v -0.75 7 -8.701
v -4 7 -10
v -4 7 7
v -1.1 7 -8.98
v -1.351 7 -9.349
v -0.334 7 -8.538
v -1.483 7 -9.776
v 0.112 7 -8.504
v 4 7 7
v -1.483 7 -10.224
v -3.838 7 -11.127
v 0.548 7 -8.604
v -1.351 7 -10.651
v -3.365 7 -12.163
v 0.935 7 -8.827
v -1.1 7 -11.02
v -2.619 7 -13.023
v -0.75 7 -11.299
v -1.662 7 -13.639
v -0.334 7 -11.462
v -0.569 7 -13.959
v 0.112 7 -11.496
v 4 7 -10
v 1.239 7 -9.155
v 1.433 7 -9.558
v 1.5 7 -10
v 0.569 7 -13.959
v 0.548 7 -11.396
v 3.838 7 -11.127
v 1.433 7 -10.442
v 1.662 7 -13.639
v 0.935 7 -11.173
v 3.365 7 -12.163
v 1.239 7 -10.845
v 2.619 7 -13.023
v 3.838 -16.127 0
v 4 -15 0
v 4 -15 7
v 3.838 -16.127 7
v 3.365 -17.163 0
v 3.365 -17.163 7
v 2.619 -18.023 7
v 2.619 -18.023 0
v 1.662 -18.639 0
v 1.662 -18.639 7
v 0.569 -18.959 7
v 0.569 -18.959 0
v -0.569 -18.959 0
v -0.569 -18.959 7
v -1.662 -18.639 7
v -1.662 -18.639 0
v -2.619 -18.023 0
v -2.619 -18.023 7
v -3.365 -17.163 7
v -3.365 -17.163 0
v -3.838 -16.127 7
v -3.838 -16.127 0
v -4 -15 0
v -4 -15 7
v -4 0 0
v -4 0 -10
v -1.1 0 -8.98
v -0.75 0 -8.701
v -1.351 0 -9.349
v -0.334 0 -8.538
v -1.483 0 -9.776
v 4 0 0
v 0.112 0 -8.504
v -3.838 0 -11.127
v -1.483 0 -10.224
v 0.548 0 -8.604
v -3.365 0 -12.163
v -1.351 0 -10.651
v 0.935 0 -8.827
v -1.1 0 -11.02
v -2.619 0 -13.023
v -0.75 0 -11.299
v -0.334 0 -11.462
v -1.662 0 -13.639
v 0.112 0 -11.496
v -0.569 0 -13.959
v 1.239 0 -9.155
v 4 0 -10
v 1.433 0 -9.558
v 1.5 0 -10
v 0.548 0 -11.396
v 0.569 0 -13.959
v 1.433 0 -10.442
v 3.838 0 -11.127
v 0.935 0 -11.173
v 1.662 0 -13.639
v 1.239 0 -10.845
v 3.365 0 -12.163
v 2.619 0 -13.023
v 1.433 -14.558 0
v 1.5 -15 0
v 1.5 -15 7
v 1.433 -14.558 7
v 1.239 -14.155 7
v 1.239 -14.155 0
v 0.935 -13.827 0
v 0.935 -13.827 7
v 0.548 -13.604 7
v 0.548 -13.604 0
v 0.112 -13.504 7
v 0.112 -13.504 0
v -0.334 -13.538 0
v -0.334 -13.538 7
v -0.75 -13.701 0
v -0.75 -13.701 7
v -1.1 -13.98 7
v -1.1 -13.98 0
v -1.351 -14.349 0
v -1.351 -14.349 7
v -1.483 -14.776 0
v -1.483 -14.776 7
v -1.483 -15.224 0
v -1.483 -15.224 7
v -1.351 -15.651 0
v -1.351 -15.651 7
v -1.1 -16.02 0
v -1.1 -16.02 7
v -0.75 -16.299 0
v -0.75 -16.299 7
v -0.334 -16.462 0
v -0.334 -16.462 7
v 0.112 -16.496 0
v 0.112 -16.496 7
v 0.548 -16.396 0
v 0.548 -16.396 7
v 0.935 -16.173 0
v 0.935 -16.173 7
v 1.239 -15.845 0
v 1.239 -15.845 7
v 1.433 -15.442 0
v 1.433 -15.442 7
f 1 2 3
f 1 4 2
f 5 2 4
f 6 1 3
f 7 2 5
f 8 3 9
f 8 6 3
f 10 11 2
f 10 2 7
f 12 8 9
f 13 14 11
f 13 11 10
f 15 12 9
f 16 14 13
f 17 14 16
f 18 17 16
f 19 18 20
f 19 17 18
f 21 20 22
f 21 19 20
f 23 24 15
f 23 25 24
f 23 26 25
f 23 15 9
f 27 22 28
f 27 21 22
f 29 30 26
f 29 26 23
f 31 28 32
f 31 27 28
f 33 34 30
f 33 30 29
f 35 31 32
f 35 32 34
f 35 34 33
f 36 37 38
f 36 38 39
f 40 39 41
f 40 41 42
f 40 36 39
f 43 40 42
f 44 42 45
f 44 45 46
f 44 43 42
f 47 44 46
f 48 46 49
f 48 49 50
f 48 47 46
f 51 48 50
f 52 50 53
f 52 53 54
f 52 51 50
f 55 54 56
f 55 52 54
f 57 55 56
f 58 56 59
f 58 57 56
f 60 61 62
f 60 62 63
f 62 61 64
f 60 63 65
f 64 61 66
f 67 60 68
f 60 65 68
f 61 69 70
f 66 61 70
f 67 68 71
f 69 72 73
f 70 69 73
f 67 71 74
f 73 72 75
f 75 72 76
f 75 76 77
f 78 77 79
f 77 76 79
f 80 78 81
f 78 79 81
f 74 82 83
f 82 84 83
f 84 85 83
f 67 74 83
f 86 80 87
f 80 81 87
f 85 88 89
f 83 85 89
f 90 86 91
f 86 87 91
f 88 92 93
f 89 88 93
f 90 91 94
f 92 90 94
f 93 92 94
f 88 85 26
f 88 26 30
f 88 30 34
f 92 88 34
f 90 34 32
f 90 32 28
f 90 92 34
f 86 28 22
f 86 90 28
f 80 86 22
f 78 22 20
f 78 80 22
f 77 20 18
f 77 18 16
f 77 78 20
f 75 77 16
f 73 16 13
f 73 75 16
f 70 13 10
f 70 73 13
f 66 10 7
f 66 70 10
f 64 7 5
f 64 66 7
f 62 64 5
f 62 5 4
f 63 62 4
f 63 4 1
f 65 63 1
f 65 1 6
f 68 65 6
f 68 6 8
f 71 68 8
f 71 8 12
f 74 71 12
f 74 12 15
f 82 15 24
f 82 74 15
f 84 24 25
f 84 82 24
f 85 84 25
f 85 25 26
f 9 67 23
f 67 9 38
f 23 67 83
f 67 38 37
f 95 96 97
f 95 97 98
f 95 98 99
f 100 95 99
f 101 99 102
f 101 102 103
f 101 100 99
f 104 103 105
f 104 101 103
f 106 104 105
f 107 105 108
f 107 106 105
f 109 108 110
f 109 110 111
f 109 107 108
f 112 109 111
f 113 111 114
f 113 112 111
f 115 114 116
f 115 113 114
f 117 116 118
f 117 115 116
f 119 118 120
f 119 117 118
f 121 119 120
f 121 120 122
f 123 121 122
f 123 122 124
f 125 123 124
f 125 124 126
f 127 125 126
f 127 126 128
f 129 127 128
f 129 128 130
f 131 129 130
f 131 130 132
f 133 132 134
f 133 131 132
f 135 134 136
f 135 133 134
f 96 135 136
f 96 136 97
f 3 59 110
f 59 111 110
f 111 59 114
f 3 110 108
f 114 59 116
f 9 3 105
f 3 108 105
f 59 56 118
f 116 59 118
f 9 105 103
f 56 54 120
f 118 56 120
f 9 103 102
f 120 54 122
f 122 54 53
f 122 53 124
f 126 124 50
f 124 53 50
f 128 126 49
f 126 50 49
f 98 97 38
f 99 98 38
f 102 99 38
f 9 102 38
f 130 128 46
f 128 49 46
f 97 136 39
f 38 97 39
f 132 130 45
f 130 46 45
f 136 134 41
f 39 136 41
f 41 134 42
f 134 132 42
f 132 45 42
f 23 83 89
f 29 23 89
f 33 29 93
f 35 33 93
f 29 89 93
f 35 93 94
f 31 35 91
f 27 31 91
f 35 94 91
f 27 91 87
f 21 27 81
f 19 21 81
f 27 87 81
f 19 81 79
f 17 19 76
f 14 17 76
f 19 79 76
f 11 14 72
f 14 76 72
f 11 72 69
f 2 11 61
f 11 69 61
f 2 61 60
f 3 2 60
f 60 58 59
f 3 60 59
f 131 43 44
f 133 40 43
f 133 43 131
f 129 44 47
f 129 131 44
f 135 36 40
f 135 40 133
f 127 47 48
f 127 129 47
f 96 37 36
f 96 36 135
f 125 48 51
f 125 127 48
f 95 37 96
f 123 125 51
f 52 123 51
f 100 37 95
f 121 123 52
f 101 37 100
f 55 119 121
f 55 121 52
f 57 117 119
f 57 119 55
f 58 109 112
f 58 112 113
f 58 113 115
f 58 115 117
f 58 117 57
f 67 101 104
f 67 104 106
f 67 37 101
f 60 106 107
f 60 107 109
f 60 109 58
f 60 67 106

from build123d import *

# Parameters (mm, degrees)
SKETCH2_R           = 1.5
BOSS_EXTRUDE1_DEPTH = 7
SKETCH3_R           = 1.5
BOSS_EXTRUDE2_DEPTH = 7


with BuildPart() as part:
    # Sketch2 → Boss-Extrude1 (new body)
    with BuildSketch(Plane.XY):
        with BuildLine():
            Line((-4, -15), (-4, 0))
            Line((-4, 0), (4, 0))
            Line((4, 0), (4, -15))
            ThreePointArc((4, -15), (0, -19), (-4, -15))
        make_face()
        with Locations((0, -15)):
            Circle(SKETCH2_R, mode=Mode.SUBTRACT)
    extrude(amount=BOSS_EXTRUDE1_DEPTH)

    # Sketch3 → Boss-Extrude2 (add)
    with BuildSketch(Plane(origin=(0, 0, 0), x_dir=(1, 0, 0), z_dir=(0, 1, 0))):
        with BuildLine():
            Line((-4, 10), (-4, -7))
            Line((-4, -7), (4, -7))
            Line((4, -7), (4, 10))
            ThreePointArc((4, 10), (0, 14), (-4, 10))
        make_face()
        with Locations((0, 10)):
            Circle(SKETCH3_R, mode=Mode.SUBTRACT)
    extrude(amount=BOSS_EXTRUDE2_DEPTH)


solid = part.part
